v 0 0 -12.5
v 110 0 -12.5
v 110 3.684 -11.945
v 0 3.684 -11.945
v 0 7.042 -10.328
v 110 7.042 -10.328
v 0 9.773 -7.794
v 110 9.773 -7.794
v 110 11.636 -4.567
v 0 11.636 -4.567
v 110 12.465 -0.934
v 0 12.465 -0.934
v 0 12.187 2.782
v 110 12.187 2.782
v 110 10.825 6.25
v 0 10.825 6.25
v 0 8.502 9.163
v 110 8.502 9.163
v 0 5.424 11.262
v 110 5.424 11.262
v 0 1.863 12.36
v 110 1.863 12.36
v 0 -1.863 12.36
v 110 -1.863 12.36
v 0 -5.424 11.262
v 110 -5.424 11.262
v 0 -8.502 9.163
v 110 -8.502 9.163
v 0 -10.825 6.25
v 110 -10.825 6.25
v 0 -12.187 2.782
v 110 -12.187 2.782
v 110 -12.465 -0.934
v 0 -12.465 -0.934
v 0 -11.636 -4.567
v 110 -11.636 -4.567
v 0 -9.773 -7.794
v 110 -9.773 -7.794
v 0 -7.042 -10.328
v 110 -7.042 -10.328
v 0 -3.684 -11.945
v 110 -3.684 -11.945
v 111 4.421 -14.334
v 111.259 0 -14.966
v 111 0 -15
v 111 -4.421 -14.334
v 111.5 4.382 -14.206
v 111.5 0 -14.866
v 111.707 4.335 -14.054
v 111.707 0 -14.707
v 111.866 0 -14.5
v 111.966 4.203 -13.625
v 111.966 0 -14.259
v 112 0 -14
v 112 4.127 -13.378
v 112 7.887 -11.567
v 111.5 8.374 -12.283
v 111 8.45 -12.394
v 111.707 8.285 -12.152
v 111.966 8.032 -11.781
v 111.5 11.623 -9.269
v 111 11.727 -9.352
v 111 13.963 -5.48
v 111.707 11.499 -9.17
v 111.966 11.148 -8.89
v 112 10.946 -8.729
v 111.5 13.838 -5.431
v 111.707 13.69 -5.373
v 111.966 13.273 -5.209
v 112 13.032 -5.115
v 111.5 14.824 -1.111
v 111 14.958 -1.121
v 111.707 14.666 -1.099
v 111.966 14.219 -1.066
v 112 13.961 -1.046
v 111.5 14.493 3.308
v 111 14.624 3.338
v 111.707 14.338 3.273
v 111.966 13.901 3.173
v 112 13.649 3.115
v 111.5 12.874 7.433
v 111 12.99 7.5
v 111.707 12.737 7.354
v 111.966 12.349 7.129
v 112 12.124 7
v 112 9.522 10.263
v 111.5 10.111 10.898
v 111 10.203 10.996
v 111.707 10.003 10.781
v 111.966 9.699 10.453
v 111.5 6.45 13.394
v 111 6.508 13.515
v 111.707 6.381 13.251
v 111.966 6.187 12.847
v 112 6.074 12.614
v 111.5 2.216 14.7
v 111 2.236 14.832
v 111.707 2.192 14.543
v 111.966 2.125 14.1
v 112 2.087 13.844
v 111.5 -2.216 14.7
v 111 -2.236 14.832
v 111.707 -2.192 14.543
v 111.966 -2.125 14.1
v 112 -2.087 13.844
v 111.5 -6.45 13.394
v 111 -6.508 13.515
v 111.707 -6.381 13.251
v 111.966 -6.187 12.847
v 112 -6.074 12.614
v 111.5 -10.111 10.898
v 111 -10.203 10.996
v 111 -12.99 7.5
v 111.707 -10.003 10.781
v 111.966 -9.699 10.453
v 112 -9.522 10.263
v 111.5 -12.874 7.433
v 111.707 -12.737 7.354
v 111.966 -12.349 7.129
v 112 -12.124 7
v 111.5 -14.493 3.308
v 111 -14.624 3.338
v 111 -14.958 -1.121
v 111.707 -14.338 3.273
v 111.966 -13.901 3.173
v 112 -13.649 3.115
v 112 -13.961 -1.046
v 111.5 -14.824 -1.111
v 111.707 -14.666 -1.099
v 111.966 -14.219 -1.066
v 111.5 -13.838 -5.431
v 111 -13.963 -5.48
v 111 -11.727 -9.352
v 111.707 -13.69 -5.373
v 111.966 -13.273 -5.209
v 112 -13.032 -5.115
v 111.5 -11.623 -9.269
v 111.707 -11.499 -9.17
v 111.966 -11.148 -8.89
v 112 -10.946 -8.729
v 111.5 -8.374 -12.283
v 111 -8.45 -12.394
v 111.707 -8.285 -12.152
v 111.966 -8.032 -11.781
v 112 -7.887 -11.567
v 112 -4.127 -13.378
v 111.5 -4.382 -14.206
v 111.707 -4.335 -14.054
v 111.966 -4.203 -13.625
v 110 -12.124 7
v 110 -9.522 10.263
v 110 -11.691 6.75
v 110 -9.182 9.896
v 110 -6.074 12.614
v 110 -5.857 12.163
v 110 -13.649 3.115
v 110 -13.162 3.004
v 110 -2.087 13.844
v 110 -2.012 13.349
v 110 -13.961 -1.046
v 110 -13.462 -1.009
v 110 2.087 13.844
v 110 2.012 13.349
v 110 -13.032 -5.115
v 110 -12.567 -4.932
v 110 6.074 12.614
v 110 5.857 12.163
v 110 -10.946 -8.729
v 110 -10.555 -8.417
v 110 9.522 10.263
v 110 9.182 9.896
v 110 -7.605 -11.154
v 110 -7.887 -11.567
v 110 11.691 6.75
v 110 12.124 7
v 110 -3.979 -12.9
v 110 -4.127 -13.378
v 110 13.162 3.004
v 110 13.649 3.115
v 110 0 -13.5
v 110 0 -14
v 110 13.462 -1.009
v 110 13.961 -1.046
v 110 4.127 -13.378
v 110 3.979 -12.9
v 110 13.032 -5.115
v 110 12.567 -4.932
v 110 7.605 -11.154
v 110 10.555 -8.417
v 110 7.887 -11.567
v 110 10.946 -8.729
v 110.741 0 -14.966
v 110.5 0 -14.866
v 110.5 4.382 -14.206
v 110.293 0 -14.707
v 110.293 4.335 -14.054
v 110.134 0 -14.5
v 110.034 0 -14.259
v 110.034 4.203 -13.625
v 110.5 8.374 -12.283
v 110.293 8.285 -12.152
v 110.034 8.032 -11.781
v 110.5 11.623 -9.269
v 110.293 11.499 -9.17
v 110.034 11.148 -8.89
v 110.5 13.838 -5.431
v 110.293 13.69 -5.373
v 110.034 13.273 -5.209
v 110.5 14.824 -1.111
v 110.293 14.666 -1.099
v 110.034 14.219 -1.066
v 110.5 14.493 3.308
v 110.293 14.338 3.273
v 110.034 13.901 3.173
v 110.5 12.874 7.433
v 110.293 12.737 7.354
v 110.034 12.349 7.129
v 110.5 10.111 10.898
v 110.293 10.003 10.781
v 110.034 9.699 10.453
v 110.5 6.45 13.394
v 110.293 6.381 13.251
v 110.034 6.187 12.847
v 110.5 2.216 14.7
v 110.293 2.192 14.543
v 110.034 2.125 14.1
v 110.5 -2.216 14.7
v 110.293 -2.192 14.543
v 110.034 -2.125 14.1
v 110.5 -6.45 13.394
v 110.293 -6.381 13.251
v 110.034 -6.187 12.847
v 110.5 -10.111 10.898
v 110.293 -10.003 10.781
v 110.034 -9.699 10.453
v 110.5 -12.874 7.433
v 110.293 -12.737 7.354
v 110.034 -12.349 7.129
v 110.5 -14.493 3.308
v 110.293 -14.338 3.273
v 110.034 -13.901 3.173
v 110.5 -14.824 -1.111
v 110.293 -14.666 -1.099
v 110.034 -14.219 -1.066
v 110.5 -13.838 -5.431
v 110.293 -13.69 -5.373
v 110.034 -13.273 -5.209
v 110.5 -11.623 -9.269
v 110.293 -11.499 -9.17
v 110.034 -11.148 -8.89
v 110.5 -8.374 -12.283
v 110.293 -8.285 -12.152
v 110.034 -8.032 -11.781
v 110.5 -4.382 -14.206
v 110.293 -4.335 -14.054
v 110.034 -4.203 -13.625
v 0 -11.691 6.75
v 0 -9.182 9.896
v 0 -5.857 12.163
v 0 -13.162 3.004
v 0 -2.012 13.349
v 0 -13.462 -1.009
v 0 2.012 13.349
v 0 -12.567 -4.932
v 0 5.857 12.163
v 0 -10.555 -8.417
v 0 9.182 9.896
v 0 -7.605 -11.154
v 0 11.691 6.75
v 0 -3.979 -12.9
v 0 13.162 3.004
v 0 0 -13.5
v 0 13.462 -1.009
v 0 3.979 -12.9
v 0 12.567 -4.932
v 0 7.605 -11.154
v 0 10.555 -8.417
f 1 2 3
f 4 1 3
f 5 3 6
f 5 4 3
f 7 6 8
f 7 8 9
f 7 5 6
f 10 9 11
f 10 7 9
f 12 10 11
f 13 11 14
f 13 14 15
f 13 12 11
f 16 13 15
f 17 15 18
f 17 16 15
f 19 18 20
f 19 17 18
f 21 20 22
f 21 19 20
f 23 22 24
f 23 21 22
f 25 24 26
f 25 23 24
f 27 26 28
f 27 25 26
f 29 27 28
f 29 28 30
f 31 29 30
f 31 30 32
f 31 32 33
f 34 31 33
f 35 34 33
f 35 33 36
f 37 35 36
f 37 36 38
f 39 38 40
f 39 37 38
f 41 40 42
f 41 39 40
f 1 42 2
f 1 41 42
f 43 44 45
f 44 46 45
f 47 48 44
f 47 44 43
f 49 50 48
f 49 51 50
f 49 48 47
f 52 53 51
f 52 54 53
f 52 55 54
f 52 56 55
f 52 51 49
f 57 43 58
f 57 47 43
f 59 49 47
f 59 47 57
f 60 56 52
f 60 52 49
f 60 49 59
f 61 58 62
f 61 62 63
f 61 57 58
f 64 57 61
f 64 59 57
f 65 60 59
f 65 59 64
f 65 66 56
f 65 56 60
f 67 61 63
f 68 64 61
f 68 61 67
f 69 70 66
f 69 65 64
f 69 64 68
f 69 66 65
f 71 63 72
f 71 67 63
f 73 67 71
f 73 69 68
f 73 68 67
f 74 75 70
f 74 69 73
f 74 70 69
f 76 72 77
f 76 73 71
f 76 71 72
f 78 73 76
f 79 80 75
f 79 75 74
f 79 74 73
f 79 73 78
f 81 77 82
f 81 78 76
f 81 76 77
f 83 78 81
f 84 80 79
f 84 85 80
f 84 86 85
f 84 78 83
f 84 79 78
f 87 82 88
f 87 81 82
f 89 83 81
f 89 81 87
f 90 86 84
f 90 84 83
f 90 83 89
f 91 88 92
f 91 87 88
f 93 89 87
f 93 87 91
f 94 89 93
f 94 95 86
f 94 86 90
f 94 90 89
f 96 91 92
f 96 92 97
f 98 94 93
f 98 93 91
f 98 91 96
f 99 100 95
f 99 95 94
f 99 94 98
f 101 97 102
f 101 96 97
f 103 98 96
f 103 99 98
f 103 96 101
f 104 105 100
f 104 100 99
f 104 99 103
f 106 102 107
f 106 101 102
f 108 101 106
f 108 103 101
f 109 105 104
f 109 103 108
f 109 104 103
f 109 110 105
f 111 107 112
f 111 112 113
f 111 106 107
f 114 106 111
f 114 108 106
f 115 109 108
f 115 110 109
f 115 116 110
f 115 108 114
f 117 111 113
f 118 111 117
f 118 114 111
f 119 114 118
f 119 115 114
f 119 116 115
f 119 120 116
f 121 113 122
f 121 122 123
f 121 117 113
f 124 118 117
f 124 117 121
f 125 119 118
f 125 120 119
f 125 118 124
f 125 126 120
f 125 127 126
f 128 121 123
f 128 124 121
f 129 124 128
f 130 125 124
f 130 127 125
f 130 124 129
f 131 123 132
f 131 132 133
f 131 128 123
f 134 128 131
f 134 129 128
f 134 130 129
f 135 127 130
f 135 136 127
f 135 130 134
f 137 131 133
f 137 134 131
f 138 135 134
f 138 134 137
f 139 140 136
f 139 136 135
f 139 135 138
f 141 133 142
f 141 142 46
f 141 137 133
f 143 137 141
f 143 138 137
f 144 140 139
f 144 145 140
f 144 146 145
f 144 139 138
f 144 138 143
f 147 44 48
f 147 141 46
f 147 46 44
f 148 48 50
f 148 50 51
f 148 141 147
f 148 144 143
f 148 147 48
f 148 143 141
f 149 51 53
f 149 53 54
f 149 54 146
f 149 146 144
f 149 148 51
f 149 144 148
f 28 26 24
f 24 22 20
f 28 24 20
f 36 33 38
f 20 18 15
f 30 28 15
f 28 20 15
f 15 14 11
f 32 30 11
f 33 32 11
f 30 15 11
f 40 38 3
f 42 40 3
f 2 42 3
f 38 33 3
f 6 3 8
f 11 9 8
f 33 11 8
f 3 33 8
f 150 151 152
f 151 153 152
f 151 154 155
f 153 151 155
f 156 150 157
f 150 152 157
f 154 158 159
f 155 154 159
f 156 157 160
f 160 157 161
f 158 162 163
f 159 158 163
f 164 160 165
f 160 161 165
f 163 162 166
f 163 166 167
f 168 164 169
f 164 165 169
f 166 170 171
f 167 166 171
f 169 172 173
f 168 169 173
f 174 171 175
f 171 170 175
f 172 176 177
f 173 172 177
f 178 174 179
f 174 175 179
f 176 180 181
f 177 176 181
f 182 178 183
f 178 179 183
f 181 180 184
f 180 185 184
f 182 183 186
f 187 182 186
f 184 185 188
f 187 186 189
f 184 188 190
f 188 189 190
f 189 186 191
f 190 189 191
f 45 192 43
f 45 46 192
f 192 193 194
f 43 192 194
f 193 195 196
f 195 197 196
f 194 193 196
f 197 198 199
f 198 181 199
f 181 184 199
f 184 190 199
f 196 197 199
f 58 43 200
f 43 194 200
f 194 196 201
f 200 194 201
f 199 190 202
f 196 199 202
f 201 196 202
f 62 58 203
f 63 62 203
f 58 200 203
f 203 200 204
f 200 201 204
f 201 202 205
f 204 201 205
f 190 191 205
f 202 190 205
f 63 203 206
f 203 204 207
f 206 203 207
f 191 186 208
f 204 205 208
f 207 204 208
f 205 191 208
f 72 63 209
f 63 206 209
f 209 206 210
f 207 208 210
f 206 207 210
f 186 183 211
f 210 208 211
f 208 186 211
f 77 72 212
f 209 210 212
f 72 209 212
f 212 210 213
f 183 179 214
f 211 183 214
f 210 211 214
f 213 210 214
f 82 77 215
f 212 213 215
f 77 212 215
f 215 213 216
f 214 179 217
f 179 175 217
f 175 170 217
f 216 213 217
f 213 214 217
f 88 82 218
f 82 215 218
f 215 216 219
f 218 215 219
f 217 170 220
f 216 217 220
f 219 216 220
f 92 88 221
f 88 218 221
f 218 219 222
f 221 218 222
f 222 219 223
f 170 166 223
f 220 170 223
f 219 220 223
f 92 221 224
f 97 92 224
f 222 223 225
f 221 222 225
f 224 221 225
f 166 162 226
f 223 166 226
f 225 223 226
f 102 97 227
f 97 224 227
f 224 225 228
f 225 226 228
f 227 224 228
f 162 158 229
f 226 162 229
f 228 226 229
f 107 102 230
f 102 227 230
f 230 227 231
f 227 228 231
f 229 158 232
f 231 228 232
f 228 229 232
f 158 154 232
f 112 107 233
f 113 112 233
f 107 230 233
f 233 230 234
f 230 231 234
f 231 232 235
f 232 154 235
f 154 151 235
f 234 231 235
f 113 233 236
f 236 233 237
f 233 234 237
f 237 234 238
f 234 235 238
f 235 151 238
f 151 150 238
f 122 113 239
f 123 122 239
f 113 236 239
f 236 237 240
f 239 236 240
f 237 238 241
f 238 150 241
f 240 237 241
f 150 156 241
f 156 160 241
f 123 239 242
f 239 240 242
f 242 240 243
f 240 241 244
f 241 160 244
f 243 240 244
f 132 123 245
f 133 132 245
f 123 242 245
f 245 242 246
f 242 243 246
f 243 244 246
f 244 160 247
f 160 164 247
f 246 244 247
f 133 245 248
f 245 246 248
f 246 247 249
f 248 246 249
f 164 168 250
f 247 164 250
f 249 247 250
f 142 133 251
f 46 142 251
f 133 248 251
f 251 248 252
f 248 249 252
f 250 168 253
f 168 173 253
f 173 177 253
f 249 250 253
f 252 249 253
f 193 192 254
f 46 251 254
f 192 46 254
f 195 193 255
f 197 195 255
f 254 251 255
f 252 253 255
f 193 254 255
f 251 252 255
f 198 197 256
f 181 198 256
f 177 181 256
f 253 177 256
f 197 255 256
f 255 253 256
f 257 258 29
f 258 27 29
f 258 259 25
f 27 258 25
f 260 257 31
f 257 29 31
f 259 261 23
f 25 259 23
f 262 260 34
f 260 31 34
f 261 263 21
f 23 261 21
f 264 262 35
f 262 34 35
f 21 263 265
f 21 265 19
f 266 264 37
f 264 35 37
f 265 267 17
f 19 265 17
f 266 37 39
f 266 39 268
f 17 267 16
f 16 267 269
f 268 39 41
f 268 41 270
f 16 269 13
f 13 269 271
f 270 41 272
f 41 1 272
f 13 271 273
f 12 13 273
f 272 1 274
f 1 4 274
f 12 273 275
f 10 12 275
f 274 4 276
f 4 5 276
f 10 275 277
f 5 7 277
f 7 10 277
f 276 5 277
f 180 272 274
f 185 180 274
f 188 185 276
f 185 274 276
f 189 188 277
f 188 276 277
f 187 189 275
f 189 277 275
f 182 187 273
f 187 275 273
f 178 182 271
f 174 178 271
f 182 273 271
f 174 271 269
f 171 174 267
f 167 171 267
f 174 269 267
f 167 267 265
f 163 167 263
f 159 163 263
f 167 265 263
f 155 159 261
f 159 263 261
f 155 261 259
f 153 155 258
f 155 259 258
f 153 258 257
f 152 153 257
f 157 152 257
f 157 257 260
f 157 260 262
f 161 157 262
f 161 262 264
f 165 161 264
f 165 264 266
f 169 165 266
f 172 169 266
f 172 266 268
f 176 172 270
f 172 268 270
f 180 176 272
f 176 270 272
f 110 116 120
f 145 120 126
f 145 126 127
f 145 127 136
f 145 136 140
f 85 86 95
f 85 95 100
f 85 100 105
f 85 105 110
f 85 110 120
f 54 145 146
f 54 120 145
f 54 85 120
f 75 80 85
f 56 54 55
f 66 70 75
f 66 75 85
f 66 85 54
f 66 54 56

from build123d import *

# Parameters (mm, degrees)
SKETCH1_R           = 13.5
SKETCH1_R_2         = 12.5
BOSS_EXTRUDE5_DEPTH = 110
SKETCH4_R           = 15
BOSS_EXTRUDE6_DEPTH = 2
FILLET7_R           = 1


with BuildPart() as part:
    # Sketch1 → Boss-Extrude5 (new body)
    with BuildSketch(Plane(origin=(0, 0, 0), x_dir=(0, 0, -1), z_dir=(1, 0, 0))):
        Circle(SKETCH1_R)
        Circle(SKETCH1_R_2, mode=Mode.SUBTRACT)
    extrude(amount=BOSS_EXTRUDE5_DEPTH)

    # Sketch4 → Boss-Extrude6 (add)
    with BuildSketch(Plane(origin=(110, 0, 0), x_dir=(0, 0, -1), z_dir=(1, 0, 0))):
        Circle(SKETCH4_R)
    extrude(amount=BOSS_EXTRUDE6_DEPTH)

    # Fillet7
    fillet7_edges = [part.edges().sort_by_distance(p)[0] for p in [
        (110, 0, 15),
        (112, 0, 15),
    ]]
    fillet(fillet7_edges, radius=FILLET7_R - 0.0001)  # a hair under: the kernel refuses the full size


solid = part.part
